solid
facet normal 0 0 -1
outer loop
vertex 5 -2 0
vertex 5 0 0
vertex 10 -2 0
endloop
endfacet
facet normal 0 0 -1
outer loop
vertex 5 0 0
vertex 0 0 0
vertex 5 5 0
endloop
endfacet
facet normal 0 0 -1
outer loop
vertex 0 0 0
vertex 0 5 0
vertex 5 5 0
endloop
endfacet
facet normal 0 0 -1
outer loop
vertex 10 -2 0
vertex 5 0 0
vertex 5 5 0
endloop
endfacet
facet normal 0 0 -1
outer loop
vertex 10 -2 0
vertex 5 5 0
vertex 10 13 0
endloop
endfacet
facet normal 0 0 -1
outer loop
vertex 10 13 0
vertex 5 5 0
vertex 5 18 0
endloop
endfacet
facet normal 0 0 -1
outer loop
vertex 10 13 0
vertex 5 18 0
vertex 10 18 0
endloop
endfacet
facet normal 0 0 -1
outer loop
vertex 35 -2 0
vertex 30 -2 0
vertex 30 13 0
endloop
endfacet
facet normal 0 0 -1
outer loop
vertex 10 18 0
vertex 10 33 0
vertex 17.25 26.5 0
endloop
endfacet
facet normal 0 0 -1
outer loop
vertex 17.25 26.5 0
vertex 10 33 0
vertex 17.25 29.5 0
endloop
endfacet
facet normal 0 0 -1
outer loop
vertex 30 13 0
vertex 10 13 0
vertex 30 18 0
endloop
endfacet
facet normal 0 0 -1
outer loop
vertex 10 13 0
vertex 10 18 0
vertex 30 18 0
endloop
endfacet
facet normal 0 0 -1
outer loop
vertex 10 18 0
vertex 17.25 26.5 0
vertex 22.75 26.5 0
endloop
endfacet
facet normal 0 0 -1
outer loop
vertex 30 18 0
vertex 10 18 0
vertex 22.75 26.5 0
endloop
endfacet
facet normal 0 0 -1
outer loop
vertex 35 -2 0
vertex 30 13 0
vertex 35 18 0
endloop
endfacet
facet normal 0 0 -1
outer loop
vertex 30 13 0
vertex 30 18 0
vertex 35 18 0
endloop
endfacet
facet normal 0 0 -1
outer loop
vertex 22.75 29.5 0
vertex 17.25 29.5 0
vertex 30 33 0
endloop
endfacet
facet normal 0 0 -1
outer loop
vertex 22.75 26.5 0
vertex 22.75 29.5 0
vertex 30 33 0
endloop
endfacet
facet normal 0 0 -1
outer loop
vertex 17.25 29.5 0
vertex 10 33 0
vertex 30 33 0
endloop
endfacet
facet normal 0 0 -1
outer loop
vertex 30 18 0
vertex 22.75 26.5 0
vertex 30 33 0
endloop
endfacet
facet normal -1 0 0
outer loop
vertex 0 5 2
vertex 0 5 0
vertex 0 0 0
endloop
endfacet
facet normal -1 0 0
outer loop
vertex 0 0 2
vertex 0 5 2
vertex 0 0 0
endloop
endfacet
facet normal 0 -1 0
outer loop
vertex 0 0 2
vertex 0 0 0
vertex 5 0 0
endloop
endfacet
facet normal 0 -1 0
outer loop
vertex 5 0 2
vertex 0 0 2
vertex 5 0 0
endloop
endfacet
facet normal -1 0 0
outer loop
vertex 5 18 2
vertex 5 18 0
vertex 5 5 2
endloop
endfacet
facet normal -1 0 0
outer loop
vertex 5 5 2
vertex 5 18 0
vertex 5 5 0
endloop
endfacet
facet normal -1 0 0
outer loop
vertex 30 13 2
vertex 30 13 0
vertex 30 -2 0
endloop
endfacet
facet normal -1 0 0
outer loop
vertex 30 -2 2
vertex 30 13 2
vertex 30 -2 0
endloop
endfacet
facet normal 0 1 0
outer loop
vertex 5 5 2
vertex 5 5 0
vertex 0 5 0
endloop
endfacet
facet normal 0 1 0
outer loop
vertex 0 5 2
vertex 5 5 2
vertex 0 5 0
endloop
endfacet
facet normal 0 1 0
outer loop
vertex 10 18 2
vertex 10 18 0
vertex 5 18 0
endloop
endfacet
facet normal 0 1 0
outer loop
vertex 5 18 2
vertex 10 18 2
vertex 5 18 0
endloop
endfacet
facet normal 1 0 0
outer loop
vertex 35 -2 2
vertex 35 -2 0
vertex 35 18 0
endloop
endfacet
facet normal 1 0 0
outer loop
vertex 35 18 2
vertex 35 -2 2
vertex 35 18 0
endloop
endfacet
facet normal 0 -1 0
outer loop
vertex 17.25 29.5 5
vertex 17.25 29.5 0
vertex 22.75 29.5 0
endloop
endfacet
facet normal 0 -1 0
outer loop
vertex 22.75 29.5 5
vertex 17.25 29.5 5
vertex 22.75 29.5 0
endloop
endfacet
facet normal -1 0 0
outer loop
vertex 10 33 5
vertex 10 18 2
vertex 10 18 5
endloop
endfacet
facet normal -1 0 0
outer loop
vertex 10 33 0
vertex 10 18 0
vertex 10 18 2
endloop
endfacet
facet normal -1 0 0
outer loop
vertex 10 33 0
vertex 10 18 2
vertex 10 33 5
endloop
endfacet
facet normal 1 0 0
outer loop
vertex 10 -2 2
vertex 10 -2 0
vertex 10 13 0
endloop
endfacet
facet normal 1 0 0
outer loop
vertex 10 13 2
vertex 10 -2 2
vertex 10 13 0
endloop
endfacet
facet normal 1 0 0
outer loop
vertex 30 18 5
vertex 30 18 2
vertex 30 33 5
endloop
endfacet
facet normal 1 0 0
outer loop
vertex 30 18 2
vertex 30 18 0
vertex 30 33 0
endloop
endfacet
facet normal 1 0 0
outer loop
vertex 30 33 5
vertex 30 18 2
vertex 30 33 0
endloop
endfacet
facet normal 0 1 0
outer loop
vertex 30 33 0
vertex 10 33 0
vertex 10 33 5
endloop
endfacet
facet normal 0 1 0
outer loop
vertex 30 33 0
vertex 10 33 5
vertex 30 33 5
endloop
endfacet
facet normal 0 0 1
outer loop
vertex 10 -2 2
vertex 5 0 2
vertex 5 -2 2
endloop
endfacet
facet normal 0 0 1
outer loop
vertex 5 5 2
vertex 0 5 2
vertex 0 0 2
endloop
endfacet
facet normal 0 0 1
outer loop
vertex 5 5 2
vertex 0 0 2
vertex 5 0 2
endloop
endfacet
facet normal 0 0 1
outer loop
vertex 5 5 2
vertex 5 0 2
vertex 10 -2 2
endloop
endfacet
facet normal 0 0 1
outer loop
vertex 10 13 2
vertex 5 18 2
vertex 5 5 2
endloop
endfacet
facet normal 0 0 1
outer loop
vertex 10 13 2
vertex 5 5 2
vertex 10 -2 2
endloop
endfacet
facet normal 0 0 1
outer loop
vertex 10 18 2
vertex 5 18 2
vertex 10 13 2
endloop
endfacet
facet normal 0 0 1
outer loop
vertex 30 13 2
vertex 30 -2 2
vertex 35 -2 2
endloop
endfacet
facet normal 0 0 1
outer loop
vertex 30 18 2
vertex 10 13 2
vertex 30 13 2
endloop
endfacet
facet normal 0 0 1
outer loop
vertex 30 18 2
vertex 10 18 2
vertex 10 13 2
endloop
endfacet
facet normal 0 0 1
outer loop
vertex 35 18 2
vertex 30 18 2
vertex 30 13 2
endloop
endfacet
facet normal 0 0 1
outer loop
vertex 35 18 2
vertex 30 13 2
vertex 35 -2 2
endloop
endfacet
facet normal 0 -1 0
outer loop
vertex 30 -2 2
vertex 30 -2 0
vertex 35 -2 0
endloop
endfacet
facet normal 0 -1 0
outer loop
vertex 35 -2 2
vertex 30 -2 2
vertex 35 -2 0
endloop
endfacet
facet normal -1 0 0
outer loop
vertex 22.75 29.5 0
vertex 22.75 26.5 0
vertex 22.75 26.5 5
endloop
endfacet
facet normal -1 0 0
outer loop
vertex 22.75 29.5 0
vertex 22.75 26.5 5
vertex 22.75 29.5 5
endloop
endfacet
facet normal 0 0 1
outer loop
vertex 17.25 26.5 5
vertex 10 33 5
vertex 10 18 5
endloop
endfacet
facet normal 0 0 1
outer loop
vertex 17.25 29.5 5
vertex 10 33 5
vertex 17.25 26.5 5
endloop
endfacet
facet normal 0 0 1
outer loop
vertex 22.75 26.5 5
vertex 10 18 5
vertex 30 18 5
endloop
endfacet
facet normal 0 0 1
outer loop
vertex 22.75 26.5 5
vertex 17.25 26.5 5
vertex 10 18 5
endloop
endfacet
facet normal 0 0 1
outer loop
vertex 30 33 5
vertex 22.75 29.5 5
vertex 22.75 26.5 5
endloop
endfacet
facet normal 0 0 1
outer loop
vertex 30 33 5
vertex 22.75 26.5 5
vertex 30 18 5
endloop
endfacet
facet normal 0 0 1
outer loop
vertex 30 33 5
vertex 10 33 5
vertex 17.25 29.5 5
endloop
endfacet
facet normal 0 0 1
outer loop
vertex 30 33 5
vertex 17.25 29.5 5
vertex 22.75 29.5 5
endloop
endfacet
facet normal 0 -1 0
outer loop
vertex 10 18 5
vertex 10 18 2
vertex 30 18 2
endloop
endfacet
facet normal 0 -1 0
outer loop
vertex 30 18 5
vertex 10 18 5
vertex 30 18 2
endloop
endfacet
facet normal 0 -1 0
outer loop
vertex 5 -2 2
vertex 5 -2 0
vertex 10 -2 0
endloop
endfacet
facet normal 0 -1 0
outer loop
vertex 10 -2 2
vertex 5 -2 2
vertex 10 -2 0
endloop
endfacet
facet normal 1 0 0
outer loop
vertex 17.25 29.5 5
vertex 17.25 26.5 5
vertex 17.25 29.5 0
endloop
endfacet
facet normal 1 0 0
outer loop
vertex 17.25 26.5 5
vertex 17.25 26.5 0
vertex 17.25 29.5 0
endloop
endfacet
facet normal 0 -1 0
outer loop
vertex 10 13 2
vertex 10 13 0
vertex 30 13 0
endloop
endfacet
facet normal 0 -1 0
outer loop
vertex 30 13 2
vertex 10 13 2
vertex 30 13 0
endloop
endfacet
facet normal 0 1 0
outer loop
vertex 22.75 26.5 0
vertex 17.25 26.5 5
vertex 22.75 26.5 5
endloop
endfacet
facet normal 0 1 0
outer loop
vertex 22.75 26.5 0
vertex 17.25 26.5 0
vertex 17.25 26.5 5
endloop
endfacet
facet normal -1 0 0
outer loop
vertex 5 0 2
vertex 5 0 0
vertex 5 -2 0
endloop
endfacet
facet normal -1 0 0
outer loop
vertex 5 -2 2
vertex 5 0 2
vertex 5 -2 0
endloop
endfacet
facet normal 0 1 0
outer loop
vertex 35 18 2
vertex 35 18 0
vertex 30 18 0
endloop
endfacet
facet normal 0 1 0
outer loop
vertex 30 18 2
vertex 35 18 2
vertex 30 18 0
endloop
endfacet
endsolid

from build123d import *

# Parameters (mm, degrees)
P_IDAT_VYSUNUT_M1_DEPTH  = 2
SKICA2_W                 = 20
SKICA2_H                 = 2
P_IDAT_VYSUNUT_M2_DEPTH  = 15
SKICA3_W                 = 5.5
SKICA3_H                 = 3
ODEBRAT_VYSUNUT_M1_DEPTH = 15
SKICA5_W                 = 20
SKICA5_H                 = 15
SKICA5_W_2               = 5.5
SKICA5_H_2               = 3
P_IDAT_VYSUNUT_M3_DEPTH  = 3


with BuildPart() as part:
    # Skica1 → Přidat vysunutím1 (new body)
    with BuildSketch(Plane.XY):
        Polygon((0, 0), (5, 0), (5, -2), (10, -2), (10, 4.082474227), (10, 13), (30, 13), (30, -2), (35, -2), (35, 18), (5, 18), (5, 5), (0, 5), align=None)
    extrude(amount=P_IDAT_VYSUNUT_M1_DEPTH)

    # Skica2 → Přidat vysunutím2 (add)
    with BuildSketch(Plane(origin=(0, 18, 0), x_dir=(1, 0, 0), z_dir=(0, 1, 0))):
        with Locations((20, -1)):
            Rectangle(SKICA2_W, SKICA2_H)
    extrude(amount=P_IDAT_VYSUNUT_M2_DEPTH)

    # Skica3 → Odebrat vysunutím1 (cut)
    with BuildSketch(Plane.XY.offset(2)):
        with Locations((20, 28)):
            Rectangle(SKICA3_W, SKICA3_H)
    extrude(amount=-ODEBRAT_VYSUNUT_M1_DEPTH, mode=Mode.SUBTRACT)

    # Skica5 → Přidat vysunutím3 (add)
    with BuildSketch(Plane.XY.offset(2)):
        with Locations((20, 25.5)):
            Rectangle(SKICA5_W, SKICA5_H)
        with Locations((20, 28)):
            Rectangle(SKICA5_W_2, SKICA5_H_2, mode=Mode.SUBTRACT)
    extrude(amount=P_IDAT_VYSUNUT_M3_DEPTH)


solid = part.part
